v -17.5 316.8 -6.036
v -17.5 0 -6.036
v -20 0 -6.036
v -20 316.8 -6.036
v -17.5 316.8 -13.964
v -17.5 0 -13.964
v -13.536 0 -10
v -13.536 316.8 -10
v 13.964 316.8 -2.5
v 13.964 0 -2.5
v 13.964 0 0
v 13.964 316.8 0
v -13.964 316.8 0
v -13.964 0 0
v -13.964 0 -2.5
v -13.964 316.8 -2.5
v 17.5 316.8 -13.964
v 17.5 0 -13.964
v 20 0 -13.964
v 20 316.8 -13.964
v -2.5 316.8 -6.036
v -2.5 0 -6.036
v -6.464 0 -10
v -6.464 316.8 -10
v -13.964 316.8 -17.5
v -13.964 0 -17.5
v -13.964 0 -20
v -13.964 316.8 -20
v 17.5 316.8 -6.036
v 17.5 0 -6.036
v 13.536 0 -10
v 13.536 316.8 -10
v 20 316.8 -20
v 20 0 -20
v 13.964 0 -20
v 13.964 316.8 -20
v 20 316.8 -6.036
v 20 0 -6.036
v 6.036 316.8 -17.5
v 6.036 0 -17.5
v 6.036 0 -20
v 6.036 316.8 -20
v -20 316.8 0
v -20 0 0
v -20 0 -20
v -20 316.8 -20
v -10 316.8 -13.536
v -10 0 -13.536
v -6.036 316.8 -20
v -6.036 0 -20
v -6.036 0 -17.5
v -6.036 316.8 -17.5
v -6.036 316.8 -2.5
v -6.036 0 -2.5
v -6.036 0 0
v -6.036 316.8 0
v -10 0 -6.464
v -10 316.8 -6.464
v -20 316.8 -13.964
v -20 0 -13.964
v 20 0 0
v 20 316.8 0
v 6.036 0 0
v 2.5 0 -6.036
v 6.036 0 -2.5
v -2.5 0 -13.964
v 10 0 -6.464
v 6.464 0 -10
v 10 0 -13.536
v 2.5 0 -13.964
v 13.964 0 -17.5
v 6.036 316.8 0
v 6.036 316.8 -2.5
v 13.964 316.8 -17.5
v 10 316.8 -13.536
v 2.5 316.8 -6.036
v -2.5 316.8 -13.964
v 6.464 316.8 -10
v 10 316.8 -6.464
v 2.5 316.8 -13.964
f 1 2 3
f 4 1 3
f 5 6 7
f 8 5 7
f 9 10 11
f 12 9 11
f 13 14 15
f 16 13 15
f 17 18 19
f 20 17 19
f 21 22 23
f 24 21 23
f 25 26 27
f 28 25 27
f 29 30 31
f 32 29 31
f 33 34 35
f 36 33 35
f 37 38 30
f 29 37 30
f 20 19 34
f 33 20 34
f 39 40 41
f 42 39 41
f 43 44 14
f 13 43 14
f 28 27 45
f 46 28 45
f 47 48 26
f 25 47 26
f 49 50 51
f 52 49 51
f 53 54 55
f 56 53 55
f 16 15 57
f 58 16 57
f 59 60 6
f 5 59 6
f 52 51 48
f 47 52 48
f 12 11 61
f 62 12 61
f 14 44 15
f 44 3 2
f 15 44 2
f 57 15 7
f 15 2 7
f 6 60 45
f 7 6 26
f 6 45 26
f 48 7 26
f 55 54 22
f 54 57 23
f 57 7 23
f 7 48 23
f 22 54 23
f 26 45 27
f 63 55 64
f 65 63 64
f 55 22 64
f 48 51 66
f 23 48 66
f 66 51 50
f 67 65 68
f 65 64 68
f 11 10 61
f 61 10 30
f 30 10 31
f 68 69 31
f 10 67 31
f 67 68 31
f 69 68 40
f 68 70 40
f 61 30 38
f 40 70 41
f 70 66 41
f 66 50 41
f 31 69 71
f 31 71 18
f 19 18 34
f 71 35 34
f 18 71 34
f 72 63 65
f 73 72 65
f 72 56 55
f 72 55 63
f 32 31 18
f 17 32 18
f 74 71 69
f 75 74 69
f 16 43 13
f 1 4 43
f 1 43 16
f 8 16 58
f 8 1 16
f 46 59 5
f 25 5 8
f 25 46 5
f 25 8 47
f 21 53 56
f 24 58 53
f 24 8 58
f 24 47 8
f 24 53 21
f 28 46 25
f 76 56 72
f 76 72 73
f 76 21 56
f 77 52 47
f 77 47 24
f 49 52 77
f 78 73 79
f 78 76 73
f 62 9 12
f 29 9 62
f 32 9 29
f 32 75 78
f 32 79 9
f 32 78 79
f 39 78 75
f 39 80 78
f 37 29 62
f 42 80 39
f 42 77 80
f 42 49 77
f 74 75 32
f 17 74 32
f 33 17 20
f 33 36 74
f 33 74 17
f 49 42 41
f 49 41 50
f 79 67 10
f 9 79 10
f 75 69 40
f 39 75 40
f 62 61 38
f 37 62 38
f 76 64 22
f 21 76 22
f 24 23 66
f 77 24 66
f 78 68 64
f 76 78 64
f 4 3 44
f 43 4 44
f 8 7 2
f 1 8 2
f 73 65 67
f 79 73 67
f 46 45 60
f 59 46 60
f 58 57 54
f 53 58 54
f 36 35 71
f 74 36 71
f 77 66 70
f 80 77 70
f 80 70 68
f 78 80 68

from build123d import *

# Parameters (mm, degrees)
BOSS_EXTRU_2_DEPTH = 316.8


with BuildPart() as part:
    # Esquisse1<3> → Boss.-Extru.2 (new body)
    with BuildSketch(Plane(origin=(0, 0, 0), x_dir=(1, 0, 0), z_dir=(0, 1, 0))):
        Polygon((-6.035533906, 17.5), (-10, 13.535533906), (-13.964466094, 17.5), (-13.964466094, 20), (-20, 20), (-20, 13.964466094), (-17.5, 13.964466094), (-13.535533906, 10), (-17.5, 6.035533906), (-20, 6.035533906), (-20, 0), (-13.964466094, 0), (-13.964466094, 2.5), (-10, 6.464466094), (-6.035533906, 2.5), (-6.035533906, 0), (6.035533906, 0), (6.035533906, 2.5), (10, 6.464466094), (13.964466094, 2.5), (13.964466094, 0), (20, 0), (20, 6.035533906), (17.5, 6.035533906), (13.535533906, 10), (17.5, 13.964466094), (20, 13.964466094), (20, 20), (13.964466094, 20), (13.964466094, 17.5), (10, 13.535533906), (6.035533906, 17.5), (6.035533906, 20), (-6.035533906, 20), align=None)
        Polygon((-6.464466094, 10), (-2.5, 13.964466094), (2.5, 13.964466094), (6.464466094, 10), (2.5, 6.035533906), (-2.5, 6.035533906), align=None, mode=Mode.SUBTRACT)
    extrude(amount=BOSS_EXTRU_2_DEPTH)


solid = part.part
